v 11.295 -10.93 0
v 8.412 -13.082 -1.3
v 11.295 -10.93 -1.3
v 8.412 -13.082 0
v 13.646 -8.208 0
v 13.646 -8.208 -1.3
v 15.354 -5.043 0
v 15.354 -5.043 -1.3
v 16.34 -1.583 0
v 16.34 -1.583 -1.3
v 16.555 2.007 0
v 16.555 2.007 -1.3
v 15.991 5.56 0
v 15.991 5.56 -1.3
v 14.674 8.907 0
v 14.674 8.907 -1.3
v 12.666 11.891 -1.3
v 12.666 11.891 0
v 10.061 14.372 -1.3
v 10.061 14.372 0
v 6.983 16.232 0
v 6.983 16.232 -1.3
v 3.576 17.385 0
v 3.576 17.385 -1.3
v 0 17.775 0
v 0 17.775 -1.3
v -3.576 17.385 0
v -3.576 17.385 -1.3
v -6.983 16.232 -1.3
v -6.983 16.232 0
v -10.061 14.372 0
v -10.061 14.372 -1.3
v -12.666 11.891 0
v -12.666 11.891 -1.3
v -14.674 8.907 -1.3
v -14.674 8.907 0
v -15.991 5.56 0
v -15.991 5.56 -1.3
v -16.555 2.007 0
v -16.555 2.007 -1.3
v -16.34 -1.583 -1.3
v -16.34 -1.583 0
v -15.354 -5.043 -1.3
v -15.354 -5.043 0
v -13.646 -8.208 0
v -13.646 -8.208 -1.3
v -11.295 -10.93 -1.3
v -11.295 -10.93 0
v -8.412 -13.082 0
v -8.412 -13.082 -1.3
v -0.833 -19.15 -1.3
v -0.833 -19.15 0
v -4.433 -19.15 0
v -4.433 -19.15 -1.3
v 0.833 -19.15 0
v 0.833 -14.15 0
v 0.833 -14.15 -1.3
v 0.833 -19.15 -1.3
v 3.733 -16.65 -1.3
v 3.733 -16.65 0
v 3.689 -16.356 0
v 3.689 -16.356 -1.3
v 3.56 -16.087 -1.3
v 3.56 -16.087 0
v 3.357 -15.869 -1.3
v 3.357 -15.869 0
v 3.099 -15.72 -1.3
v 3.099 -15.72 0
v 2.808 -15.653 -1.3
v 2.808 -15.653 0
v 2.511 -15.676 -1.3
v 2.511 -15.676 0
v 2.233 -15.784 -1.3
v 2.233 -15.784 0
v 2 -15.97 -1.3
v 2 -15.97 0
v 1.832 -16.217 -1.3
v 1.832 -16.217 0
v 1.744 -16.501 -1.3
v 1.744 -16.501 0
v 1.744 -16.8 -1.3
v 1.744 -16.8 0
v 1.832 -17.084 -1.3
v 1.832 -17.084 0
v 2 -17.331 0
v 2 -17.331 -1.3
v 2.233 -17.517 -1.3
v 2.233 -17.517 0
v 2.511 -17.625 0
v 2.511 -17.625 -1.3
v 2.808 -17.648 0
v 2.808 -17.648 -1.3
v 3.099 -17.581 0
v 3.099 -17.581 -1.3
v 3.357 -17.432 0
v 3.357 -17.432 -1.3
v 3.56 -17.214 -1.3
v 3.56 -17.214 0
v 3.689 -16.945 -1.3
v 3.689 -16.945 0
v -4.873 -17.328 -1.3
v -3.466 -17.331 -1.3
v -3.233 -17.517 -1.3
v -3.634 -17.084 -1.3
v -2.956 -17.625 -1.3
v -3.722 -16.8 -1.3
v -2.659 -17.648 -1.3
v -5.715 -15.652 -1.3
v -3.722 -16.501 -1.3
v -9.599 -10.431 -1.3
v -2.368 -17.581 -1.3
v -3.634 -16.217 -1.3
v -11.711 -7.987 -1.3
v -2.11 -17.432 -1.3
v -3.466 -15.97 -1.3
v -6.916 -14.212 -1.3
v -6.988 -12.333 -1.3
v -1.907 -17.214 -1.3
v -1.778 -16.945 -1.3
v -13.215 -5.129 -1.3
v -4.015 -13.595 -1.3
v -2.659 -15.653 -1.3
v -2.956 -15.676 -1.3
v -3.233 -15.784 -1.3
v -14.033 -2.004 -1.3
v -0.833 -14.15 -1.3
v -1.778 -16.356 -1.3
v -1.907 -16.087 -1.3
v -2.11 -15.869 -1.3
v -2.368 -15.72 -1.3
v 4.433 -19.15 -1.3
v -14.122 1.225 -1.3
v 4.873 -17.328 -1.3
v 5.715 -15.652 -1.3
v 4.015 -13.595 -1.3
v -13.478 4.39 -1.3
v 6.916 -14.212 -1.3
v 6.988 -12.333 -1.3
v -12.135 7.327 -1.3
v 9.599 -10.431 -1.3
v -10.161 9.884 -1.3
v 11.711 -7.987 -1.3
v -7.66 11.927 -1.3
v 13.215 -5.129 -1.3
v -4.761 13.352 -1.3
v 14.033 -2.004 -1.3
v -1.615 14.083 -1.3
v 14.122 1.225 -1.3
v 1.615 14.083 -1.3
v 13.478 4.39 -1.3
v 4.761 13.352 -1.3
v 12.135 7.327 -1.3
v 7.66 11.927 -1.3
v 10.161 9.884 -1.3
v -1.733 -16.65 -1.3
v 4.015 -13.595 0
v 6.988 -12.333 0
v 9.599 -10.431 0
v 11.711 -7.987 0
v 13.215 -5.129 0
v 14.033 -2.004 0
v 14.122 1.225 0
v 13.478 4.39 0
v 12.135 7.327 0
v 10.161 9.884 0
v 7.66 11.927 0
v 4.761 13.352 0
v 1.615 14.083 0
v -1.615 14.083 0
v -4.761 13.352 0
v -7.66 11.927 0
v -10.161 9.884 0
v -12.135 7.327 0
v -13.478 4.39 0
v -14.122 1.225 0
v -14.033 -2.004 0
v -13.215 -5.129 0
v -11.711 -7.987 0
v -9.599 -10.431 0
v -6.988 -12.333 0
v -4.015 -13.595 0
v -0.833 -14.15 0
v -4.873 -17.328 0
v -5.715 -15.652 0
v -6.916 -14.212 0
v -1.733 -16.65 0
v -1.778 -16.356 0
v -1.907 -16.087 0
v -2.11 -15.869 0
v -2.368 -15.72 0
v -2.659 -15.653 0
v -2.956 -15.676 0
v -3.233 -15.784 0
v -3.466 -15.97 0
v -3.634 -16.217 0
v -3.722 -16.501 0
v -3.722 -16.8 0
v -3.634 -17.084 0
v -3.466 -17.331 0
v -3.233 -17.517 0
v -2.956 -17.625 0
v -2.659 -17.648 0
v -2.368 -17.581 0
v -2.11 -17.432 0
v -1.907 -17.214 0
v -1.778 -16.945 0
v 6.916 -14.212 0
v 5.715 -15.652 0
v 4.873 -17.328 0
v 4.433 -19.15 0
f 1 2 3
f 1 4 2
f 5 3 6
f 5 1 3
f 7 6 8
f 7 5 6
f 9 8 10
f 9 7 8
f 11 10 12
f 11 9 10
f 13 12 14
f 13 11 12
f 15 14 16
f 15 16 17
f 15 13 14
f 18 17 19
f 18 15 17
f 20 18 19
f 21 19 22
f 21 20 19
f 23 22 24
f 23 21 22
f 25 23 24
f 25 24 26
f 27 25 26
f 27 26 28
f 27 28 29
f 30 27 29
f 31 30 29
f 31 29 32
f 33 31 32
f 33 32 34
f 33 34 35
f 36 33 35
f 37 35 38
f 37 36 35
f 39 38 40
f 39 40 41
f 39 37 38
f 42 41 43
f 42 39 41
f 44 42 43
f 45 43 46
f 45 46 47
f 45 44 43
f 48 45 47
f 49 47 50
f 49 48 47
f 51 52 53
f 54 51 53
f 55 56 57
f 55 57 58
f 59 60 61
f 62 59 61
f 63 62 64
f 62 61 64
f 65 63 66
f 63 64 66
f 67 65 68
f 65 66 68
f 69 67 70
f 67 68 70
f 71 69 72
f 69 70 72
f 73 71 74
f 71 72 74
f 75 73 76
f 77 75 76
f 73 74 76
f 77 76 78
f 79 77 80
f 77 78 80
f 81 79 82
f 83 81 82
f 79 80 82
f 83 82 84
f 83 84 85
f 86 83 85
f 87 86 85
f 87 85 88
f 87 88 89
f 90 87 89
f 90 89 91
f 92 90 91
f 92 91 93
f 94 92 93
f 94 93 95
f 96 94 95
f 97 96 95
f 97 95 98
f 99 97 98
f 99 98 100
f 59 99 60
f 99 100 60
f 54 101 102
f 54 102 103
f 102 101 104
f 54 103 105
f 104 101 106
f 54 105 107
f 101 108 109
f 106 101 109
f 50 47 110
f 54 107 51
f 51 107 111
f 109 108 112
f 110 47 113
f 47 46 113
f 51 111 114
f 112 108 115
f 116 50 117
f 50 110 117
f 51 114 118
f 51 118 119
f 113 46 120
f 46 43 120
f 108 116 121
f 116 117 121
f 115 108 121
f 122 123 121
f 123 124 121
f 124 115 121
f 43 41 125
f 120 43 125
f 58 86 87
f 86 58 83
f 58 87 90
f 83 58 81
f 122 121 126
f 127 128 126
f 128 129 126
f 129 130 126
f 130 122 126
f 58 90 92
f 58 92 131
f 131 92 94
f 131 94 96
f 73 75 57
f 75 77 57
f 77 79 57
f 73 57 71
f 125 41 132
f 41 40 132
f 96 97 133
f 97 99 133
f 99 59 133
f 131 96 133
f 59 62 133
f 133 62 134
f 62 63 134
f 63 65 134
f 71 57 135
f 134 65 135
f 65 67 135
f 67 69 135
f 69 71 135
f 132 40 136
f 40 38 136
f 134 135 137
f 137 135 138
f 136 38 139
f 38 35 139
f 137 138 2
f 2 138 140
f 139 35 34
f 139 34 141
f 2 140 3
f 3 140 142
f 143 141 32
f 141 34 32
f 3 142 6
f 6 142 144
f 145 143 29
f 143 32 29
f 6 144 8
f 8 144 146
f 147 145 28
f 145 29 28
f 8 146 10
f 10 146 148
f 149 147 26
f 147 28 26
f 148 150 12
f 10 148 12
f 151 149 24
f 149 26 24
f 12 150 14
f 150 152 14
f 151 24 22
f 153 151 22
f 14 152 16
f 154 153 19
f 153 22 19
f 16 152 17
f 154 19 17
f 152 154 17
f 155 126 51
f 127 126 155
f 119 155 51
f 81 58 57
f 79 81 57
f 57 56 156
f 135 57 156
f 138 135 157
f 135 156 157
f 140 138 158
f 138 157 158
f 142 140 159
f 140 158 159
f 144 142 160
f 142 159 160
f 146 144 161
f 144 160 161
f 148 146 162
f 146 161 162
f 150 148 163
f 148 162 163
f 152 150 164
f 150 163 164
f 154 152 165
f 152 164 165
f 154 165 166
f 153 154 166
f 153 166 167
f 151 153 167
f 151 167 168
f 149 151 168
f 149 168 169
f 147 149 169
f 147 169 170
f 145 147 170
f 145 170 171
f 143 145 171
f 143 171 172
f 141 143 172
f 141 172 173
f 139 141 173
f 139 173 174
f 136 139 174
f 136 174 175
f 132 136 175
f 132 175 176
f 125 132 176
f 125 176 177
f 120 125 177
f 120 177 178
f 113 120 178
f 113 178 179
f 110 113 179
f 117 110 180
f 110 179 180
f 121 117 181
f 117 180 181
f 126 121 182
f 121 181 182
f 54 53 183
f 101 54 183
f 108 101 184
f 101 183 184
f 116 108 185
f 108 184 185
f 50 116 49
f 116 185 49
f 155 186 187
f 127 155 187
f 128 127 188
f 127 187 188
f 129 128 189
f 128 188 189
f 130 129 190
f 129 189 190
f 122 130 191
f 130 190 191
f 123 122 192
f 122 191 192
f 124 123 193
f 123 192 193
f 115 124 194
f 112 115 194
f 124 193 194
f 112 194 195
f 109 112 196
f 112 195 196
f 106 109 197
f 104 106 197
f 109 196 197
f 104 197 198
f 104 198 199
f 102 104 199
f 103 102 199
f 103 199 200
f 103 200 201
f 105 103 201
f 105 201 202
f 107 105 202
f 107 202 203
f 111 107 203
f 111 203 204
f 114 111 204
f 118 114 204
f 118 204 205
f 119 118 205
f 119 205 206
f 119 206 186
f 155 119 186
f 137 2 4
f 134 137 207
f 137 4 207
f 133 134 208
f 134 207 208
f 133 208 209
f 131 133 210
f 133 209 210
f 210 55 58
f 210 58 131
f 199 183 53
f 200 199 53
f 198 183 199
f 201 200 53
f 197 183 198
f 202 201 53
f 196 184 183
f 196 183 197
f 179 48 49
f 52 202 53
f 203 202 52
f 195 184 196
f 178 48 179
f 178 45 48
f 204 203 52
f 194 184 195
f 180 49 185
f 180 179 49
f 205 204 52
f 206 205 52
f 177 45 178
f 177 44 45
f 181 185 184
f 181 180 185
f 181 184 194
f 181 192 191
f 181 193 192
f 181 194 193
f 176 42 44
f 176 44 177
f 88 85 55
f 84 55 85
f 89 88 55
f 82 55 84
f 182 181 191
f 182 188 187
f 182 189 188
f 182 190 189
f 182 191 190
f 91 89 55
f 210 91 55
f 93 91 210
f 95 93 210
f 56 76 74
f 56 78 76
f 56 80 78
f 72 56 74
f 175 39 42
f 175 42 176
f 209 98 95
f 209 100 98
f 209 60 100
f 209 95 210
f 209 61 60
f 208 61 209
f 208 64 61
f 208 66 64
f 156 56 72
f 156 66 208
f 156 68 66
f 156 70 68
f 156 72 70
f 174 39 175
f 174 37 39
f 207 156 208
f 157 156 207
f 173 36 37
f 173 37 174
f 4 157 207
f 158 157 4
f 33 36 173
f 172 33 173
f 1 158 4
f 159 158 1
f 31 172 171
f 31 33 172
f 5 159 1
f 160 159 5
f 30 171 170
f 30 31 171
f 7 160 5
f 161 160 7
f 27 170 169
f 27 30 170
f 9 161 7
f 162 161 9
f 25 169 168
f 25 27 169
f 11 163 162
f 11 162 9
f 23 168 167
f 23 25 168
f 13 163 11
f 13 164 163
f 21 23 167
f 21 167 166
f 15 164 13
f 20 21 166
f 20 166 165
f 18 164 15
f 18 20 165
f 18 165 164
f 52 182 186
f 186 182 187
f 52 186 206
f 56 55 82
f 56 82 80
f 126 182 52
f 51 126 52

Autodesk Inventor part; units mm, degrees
ref_plane "YZ Plane" through (0, 0, 0) normal (1, 0, 0) x (0, 1, 0)
ref_plane "XZ Plane" through (0, 0, 0) normal (0, 1, 0) x (-1, 0, 0)
ref_plane "XY Plane" through (0, 0, 0) normal (0, 0, 1) x (1, 0, 0)
sketch "草图2" plane through (0, 0, 0) normal (0, 0, 1) x (1, 0, 0)
  line L0 (-0.8333, -19.1505) -> (-4.4333, -19.1505)
  line L1 (-0.8333, -14.1505) -> (-0.8333, -19.1505)
  arc A0 (0.8333, -14.1505) -> (-0.8333, -14.1505) centre (0, 0) ccw
  arc A1 (8.4124, -13.0815) -> (-8.4124, -13.0815) centre (0, 1.2) ccw
  line L2 (0, -19.4467) -> (0, 17.2703) projected
  line L3 (0.8333, -19.1505) -> (4.4333, -19.1505)
  line L4 (0.8333, -14.1505) -> (0.8333, -19.1505)
  arc A2 (-4.4333, -19.1505) -> (-8.4124, -13.0815) centre (-12.5763, -20.1505) ccw
  arc A3 (8.4124, -13.0815) -> (4.4333, -19.1505) centre (12.5763, -20.1505) ccw
  dimension "d15" = 1.2
  dimension "d28" = 28.35
  dimension "d32" = 3.6
  dimension "d34" = 5
  dimension "d35" = 1.6667
  dimension "d48" = 3.6
  dimension "d49" = 1
extrude "拉伸1" add sketch "草图2" against normal blind 1.3
sketch "草图3" plane through (0, 0, 0) normal (0, 0, 1) x (1, 0, 0)
  circle A0 centre (-2.7333, -16.6505) radius 1
  line L0 (-0.8333, -19.1505) -> (-4.4333, -19.1505) projected
  line L1 (0.8333, -19.1505) -> (0.8333, -14.1505) projected
  line L2 (4.4333, -19.1505) -> (0.8333, -19.1505) projected
  line L3 (0, -14.2014) -> (0, -8.6014) projected
  circle A1 centre (2.7333, -16.6505) radius 1
  dimension "d36" = 2
  dimension "d37" = 2.5
  dimension "d47" = 5.4667
extrude "拉伸2" cut sketch "草图3" against normal through all
equation "\"d15\" = 0.333333 * b"
equation "\"d28\" = g1"
equation "\"d32\" = b"
equation "\"d34\" = ParA"
equation "\"d35\" = 0.333333 * ParA"
equation "\"d48\" = 1.8 * Diam5"
equation "\"d49\" = 0.2 * ParA"
equation "\"d16\" = tt"
equation "\"d36\" = Diam5"
equation "\"d37\" = 0.5 * ParA"
equation "\"d47\" = 0.333333 * ParA + 1.9 * Diam5"
equation "\"g1\" = 28.35"
equation "\"ParA\" = 5"
equation "\"tt\" = 1.3"
equation "\"Diam5\" = 2"
equation "\"TEMPLATE\" = 1.2345"
properties part number "ANSI B 27.7M - 3AMI-30" material "钢，软"
